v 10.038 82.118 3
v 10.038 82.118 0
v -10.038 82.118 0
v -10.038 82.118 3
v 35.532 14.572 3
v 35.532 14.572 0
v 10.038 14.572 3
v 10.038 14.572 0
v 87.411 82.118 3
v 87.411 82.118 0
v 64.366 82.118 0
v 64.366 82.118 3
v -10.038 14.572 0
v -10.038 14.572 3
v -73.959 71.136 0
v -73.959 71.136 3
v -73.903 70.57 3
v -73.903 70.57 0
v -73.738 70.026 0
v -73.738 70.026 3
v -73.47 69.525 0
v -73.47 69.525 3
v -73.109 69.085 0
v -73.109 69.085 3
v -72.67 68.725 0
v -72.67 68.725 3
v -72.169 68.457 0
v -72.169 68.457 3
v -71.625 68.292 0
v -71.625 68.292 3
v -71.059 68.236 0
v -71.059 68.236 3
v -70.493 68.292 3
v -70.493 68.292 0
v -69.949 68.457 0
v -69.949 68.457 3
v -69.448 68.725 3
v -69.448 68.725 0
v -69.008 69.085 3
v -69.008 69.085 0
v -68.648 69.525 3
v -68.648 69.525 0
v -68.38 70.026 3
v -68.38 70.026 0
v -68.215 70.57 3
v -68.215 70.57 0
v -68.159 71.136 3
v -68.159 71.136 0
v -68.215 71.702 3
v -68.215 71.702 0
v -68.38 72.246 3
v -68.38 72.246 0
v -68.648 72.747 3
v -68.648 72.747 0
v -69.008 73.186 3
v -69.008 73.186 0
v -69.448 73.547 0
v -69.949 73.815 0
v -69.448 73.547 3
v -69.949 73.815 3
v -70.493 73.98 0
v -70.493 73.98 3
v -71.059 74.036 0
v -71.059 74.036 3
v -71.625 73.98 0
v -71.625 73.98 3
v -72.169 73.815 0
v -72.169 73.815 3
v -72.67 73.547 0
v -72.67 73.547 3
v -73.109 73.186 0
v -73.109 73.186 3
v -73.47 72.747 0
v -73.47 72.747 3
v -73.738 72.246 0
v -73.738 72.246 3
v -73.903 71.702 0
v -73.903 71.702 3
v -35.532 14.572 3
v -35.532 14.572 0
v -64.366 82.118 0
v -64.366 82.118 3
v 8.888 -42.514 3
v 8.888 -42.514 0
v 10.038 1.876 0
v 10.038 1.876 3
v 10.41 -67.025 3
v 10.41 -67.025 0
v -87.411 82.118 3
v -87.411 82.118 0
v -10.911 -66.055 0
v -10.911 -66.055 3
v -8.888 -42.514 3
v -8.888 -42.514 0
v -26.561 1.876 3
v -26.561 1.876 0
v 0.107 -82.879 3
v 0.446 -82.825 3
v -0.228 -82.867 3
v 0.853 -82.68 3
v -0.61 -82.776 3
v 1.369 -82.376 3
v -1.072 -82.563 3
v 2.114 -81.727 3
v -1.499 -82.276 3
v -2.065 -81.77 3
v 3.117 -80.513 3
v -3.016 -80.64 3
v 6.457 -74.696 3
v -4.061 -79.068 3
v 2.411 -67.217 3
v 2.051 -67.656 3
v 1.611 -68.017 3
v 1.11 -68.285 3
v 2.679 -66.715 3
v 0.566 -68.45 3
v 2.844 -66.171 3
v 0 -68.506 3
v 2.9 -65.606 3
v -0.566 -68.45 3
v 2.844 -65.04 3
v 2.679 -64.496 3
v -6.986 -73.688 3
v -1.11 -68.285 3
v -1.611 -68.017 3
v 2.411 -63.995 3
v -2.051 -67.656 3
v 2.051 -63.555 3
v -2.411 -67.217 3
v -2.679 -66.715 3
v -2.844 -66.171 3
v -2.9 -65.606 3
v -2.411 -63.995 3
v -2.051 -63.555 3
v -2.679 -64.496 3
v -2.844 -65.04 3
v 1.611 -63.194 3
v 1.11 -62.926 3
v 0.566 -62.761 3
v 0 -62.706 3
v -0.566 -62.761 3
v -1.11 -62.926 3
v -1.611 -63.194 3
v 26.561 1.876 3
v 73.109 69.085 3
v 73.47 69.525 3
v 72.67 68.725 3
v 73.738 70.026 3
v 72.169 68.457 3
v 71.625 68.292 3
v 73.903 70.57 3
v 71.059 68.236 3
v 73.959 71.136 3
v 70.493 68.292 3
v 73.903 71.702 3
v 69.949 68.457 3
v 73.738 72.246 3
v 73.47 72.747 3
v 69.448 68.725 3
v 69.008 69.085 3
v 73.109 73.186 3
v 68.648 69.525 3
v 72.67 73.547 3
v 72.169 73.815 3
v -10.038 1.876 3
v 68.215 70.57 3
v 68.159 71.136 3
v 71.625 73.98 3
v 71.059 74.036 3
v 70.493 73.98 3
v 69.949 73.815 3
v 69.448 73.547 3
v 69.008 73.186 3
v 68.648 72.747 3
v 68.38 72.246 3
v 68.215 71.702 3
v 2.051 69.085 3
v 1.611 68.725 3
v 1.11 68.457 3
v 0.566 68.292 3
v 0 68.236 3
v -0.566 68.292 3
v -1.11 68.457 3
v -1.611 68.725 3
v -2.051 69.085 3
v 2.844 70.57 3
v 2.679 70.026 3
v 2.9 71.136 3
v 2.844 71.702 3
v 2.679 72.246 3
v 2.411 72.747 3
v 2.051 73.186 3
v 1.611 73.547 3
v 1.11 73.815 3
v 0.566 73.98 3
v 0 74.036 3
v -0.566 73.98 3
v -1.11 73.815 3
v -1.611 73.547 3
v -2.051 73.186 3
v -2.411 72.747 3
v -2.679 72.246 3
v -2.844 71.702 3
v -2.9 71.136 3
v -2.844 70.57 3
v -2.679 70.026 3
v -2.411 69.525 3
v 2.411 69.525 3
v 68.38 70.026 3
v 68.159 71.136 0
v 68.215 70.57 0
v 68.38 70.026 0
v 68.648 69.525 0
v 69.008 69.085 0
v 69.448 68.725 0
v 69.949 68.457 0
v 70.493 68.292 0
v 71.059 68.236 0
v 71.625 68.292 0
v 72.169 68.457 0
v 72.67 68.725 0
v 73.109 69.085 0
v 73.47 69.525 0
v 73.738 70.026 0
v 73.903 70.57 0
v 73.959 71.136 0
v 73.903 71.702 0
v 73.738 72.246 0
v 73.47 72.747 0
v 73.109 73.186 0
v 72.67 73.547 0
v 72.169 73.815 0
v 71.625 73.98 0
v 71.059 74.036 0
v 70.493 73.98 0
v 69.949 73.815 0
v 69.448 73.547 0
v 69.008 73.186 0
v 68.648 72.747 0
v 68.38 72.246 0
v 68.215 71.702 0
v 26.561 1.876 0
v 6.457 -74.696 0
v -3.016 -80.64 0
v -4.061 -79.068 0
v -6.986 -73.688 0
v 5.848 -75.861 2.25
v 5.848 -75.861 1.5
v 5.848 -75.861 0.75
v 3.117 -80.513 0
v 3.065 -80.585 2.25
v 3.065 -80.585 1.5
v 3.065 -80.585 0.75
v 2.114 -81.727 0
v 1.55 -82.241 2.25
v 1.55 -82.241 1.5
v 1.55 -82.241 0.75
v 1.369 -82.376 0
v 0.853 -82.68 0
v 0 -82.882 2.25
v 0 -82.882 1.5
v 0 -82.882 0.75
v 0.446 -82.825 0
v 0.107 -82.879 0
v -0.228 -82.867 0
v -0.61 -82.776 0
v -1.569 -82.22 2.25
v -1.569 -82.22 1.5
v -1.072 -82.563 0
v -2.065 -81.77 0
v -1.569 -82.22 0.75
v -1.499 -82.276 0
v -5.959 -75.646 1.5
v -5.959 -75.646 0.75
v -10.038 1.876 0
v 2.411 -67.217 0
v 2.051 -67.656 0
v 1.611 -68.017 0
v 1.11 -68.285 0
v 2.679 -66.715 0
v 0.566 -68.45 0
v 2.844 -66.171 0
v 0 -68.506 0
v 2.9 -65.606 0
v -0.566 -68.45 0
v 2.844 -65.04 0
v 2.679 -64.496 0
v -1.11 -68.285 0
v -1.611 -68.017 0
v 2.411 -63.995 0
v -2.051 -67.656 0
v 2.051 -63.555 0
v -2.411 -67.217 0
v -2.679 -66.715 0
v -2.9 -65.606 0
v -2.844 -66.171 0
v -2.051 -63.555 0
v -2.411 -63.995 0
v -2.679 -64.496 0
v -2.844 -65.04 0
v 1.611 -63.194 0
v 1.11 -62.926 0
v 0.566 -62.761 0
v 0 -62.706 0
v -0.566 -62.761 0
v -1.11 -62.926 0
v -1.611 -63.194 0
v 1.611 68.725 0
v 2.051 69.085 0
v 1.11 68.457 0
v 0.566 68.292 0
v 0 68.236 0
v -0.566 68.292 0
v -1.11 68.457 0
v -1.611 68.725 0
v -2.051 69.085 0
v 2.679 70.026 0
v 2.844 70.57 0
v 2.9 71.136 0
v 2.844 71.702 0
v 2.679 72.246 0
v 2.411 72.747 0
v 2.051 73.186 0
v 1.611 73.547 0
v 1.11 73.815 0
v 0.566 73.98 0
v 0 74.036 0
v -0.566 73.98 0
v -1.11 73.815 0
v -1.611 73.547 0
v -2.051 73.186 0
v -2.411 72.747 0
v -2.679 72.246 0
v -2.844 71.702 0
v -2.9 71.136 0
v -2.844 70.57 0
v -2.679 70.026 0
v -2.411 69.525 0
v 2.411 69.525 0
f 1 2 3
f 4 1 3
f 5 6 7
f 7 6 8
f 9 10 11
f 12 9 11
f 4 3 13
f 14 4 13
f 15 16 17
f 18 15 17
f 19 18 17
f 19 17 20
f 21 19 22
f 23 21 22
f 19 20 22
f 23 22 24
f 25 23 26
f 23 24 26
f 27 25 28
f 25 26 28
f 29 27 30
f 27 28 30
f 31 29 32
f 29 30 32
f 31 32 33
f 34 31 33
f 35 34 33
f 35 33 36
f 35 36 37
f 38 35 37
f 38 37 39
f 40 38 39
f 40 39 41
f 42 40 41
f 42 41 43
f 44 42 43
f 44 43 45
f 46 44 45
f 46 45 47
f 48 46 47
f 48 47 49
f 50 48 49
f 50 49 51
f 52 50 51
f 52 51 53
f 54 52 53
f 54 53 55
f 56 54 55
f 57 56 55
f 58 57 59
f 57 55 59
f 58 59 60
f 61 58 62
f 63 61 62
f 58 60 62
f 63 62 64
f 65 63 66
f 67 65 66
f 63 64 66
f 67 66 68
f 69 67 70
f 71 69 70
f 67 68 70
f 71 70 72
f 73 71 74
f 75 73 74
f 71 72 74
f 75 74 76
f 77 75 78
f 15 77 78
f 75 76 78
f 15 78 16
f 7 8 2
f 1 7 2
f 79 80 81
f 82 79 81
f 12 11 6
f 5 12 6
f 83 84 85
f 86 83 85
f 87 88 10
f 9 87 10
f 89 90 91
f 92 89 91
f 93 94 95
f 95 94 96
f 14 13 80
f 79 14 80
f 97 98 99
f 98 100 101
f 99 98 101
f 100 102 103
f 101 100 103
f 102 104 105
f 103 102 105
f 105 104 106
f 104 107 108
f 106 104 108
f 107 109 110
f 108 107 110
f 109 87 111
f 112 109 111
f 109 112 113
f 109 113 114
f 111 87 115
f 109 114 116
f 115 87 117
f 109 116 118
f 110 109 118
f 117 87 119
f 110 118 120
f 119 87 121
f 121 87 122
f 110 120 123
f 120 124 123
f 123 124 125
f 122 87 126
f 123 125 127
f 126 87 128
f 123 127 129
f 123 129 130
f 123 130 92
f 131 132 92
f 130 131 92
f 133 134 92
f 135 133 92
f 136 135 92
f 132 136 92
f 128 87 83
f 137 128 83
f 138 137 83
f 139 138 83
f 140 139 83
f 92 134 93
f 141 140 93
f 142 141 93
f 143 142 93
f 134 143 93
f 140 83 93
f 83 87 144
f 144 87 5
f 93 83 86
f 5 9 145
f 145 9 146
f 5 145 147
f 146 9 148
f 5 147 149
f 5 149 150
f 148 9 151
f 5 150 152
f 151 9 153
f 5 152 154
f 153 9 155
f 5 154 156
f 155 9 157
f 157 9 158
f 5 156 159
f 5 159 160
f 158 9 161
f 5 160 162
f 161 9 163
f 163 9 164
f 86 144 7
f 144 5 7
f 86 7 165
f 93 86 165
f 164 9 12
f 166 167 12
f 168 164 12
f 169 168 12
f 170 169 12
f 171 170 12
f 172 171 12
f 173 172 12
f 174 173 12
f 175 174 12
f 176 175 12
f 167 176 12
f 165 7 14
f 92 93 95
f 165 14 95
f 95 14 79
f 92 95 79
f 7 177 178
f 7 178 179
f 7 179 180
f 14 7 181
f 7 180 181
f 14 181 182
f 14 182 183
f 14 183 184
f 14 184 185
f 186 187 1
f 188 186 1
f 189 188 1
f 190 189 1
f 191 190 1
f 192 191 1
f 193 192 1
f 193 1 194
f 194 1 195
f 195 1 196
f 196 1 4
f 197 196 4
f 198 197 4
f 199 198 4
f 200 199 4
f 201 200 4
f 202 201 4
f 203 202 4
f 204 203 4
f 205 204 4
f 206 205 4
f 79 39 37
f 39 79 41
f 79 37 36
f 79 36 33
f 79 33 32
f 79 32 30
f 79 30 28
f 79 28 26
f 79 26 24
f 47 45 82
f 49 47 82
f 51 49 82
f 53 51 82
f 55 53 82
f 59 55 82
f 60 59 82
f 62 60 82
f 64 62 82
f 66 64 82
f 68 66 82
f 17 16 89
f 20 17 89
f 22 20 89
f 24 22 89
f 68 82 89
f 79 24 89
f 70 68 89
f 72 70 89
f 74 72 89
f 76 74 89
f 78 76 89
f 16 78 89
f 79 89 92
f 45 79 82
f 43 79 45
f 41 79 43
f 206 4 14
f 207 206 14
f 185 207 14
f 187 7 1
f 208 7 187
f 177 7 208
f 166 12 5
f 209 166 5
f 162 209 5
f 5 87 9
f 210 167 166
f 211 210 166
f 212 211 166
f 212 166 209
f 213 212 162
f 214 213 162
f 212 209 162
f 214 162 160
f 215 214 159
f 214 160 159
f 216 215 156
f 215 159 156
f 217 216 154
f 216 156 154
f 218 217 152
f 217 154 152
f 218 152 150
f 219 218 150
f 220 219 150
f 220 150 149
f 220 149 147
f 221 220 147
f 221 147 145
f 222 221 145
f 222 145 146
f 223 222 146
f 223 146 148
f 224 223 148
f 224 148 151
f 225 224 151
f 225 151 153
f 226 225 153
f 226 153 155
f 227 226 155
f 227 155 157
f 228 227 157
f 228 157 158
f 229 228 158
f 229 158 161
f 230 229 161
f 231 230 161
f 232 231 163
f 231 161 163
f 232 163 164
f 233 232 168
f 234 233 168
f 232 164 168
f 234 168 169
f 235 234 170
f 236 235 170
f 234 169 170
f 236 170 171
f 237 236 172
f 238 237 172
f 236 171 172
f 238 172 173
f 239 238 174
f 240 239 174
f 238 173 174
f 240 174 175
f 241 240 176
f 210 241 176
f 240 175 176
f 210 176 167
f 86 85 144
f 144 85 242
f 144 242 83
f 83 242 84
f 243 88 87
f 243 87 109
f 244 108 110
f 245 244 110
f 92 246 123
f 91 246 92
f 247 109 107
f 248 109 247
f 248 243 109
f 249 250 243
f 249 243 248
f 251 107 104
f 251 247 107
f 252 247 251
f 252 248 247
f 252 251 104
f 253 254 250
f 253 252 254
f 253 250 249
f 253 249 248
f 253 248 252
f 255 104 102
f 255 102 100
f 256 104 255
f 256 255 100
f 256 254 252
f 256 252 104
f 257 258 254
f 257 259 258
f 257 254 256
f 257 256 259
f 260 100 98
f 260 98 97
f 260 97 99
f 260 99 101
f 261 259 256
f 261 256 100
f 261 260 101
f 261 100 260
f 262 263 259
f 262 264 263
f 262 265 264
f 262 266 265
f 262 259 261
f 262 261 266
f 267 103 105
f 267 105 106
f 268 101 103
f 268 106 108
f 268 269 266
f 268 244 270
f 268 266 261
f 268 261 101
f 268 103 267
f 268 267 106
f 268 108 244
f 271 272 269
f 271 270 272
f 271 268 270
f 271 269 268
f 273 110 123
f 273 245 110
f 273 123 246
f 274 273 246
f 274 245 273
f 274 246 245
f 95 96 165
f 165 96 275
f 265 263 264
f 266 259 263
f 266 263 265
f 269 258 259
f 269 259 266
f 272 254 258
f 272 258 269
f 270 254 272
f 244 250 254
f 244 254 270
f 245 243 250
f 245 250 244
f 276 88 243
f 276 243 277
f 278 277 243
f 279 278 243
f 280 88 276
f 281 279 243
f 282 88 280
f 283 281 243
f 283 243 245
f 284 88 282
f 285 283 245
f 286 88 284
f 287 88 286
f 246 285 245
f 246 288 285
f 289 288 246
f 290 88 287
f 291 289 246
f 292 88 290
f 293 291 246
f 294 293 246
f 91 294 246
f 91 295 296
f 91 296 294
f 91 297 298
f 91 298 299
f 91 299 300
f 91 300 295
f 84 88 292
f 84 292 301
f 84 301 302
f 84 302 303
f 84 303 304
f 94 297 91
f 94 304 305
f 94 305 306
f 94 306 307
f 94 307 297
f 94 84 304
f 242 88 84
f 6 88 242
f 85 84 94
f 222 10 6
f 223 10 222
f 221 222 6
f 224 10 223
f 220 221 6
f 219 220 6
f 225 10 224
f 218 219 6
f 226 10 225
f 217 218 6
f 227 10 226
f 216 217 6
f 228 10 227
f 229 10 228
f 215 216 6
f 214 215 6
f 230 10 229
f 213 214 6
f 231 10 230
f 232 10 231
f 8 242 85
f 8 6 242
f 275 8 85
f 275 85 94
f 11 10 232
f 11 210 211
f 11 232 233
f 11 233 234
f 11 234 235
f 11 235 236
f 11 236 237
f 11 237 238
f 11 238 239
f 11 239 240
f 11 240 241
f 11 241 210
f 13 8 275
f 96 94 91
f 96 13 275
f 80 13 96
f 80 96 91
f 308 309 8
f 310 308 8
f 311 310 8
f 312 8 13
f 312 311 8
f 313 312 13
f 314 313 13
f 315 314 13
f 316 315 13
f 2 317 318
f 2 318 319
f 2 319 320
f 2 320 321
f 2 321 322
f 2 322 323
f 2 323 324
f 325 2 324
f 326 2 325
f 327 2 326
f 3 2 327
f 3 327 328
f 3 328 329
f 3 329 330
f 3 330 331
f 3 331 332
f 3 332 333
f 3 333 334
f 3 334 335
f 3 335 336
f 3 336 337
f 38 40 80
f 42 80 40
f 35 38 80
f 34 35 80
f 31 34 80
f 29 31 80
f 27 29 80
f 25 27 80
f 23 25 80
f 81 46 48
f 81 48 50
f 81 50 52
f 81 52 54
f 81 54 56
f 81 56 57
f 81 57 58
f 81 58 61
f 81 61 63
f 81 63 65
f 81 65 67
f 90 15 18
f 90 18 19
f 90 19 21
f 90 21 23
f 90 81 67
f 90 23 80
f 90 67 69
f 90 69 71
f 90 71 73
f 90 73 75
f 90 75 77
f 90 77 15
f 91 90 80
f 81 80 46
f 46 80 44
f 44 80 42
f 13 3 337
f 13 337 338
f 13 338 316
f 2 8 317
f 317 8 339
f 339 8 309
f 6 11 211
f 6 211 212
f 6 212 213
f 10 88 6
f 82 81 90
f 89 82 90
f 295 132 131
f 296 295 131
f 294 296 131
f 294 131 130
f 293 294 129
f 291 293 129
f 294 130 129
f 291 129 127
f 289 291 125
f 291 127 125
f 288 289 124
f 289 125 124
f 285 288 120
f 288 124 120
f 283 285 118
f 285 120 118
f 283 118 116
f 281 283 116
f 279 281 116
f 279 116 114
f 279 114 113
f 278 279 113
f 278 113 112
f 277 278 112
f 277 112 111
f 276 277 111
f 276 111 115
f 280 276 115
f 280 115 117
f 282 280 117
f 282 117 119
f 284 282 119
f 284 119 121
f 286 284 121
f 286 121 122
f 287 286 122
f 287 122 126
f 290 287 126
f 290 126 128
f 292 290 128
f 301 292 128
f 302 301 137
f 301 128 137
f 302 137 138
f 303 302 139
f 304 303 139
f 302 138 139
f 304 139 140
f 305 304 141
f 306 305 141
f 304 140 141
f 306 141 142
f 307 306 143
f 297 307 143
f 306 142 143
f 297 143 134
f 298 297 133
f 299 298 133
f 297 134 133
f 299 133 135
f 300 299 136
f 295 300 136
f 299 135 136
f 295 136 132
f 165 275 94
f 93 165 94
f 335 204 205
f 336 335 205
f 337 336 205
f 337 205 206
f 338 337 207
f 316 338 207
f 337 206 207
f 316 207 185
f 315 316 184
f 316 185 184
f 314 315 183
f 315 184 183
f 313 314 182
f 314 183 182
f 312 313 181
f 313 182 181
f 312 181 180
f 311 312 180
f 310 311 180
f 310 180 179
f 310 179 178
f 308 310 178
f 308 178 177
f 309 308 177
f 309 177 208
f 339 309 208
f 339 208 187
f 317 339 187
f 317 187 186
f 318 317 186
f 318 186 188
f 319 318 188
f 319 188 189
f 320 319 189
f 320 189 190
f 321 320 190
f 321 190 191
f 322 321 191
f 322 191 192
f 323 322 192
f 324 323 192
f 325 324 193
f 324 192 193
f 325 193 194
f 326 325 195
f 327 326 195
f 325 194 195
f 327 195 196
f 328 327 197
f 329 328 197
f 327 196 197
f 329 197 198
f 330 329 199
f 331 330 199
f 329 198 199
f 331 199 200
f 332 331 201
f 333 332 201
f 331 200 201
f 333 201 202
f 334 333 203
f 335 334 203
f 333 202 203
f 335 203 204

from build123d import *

# Parameters (mm, degrees)
F1_DEPTH   = 3
F4_D       = 5.8
F4_ON_F2_D = 5.8


with BuildPart() as f1:
    # F0 (on Top) → F1 (new body)
    with BuildSketch(Plane.XY):
        with BuildLine():
            add(Edge.make_bspline(
                [(10.4103045447, -67.024596429), (8.982228674, -69.7149249082), (6.3151262234, -75.1432740364), (-0.0293251038, -86.7211019833), (-6.4479244726, -74.8137621783), (-9.3542937571, -69.1019658828), (-10.9111016264, -66.0546038255)],
                knots=[0, 0, 0, 0, 0.2518062745, 0.4931803978, 0.7376570715, 1, 1, 1, 1], degree=3))
            Line((10.4103045447, -67.024596429), (87.4111636015, 82.118173113))
            Line((87.4111636015, 82.118173113), (64.3657235353, 82.118173113))
            Line((64.3657235353, 82.118173113), (35.5318893309, 14.5721204152))
            Line((35.5318893309, 14.5721204152), (10.0382260192, 14.5721204152))
            Line((10.0382260192, 14.5721204152), (10.0382260192, 82.118173113))
            Line((10.0382260192, 82.118173113), (0, 82.118173113))
            Line((0, 82.118173113), (-10.0382260192, 82.118173113))
            Line((-10.0382260192, 82.118173113), (-10.0382260192, 14.5721204152))
            Line((-10.0382260192, 14.5721204152), (-35.5318893309, 14.5721204152))
            Line((-35.5318893309, 14.5721204152), (-64.3657235353, 82.118173113))
            Line((-64.3657235353, 82.118173113), (-87.4111636015, 82.118173113))
            Line((-87.4111636015, 82.118173113), (-10.9111016264, -66.0546038255))
        make_face()
        Polygon((-10.0382260192, 1.8761669675), (-8.8880723342, -42.5141826272), (-26.5612563327, 1.8761669675), align=None, mode=Mode.SUBTRACT)
        Polygon((8.8880723342, -42.5141826272), (10.0382260192, 1.8761669675), (26.5612563327, 1.8761669675), align=None, mode=Mode.SUBTRACT)
    extrude(amount=F1_DEPTH)

    # F4 (through all)
    with Locations(Plane(origin=(0, 0, 0), x_dir=(1, 0, 0), z_dir=(0, 0, -1))):
        with Locations((-71.0588246584, -71.1358040571), (0, -71.1358040571), (71.0588246584, -71.1358040571)):
            Hole(F4_D / 2)

    # F4 on F2 (through all)
    with Locations(Plane(origin=(0, 0, 0), x_dir=(1, 0, 0), z_dir=(0, 0, -1))):
        with Locations((0, 65.6056776643)):
            Hole(F4_ON_F2_D / 2)


solid = f1.part
